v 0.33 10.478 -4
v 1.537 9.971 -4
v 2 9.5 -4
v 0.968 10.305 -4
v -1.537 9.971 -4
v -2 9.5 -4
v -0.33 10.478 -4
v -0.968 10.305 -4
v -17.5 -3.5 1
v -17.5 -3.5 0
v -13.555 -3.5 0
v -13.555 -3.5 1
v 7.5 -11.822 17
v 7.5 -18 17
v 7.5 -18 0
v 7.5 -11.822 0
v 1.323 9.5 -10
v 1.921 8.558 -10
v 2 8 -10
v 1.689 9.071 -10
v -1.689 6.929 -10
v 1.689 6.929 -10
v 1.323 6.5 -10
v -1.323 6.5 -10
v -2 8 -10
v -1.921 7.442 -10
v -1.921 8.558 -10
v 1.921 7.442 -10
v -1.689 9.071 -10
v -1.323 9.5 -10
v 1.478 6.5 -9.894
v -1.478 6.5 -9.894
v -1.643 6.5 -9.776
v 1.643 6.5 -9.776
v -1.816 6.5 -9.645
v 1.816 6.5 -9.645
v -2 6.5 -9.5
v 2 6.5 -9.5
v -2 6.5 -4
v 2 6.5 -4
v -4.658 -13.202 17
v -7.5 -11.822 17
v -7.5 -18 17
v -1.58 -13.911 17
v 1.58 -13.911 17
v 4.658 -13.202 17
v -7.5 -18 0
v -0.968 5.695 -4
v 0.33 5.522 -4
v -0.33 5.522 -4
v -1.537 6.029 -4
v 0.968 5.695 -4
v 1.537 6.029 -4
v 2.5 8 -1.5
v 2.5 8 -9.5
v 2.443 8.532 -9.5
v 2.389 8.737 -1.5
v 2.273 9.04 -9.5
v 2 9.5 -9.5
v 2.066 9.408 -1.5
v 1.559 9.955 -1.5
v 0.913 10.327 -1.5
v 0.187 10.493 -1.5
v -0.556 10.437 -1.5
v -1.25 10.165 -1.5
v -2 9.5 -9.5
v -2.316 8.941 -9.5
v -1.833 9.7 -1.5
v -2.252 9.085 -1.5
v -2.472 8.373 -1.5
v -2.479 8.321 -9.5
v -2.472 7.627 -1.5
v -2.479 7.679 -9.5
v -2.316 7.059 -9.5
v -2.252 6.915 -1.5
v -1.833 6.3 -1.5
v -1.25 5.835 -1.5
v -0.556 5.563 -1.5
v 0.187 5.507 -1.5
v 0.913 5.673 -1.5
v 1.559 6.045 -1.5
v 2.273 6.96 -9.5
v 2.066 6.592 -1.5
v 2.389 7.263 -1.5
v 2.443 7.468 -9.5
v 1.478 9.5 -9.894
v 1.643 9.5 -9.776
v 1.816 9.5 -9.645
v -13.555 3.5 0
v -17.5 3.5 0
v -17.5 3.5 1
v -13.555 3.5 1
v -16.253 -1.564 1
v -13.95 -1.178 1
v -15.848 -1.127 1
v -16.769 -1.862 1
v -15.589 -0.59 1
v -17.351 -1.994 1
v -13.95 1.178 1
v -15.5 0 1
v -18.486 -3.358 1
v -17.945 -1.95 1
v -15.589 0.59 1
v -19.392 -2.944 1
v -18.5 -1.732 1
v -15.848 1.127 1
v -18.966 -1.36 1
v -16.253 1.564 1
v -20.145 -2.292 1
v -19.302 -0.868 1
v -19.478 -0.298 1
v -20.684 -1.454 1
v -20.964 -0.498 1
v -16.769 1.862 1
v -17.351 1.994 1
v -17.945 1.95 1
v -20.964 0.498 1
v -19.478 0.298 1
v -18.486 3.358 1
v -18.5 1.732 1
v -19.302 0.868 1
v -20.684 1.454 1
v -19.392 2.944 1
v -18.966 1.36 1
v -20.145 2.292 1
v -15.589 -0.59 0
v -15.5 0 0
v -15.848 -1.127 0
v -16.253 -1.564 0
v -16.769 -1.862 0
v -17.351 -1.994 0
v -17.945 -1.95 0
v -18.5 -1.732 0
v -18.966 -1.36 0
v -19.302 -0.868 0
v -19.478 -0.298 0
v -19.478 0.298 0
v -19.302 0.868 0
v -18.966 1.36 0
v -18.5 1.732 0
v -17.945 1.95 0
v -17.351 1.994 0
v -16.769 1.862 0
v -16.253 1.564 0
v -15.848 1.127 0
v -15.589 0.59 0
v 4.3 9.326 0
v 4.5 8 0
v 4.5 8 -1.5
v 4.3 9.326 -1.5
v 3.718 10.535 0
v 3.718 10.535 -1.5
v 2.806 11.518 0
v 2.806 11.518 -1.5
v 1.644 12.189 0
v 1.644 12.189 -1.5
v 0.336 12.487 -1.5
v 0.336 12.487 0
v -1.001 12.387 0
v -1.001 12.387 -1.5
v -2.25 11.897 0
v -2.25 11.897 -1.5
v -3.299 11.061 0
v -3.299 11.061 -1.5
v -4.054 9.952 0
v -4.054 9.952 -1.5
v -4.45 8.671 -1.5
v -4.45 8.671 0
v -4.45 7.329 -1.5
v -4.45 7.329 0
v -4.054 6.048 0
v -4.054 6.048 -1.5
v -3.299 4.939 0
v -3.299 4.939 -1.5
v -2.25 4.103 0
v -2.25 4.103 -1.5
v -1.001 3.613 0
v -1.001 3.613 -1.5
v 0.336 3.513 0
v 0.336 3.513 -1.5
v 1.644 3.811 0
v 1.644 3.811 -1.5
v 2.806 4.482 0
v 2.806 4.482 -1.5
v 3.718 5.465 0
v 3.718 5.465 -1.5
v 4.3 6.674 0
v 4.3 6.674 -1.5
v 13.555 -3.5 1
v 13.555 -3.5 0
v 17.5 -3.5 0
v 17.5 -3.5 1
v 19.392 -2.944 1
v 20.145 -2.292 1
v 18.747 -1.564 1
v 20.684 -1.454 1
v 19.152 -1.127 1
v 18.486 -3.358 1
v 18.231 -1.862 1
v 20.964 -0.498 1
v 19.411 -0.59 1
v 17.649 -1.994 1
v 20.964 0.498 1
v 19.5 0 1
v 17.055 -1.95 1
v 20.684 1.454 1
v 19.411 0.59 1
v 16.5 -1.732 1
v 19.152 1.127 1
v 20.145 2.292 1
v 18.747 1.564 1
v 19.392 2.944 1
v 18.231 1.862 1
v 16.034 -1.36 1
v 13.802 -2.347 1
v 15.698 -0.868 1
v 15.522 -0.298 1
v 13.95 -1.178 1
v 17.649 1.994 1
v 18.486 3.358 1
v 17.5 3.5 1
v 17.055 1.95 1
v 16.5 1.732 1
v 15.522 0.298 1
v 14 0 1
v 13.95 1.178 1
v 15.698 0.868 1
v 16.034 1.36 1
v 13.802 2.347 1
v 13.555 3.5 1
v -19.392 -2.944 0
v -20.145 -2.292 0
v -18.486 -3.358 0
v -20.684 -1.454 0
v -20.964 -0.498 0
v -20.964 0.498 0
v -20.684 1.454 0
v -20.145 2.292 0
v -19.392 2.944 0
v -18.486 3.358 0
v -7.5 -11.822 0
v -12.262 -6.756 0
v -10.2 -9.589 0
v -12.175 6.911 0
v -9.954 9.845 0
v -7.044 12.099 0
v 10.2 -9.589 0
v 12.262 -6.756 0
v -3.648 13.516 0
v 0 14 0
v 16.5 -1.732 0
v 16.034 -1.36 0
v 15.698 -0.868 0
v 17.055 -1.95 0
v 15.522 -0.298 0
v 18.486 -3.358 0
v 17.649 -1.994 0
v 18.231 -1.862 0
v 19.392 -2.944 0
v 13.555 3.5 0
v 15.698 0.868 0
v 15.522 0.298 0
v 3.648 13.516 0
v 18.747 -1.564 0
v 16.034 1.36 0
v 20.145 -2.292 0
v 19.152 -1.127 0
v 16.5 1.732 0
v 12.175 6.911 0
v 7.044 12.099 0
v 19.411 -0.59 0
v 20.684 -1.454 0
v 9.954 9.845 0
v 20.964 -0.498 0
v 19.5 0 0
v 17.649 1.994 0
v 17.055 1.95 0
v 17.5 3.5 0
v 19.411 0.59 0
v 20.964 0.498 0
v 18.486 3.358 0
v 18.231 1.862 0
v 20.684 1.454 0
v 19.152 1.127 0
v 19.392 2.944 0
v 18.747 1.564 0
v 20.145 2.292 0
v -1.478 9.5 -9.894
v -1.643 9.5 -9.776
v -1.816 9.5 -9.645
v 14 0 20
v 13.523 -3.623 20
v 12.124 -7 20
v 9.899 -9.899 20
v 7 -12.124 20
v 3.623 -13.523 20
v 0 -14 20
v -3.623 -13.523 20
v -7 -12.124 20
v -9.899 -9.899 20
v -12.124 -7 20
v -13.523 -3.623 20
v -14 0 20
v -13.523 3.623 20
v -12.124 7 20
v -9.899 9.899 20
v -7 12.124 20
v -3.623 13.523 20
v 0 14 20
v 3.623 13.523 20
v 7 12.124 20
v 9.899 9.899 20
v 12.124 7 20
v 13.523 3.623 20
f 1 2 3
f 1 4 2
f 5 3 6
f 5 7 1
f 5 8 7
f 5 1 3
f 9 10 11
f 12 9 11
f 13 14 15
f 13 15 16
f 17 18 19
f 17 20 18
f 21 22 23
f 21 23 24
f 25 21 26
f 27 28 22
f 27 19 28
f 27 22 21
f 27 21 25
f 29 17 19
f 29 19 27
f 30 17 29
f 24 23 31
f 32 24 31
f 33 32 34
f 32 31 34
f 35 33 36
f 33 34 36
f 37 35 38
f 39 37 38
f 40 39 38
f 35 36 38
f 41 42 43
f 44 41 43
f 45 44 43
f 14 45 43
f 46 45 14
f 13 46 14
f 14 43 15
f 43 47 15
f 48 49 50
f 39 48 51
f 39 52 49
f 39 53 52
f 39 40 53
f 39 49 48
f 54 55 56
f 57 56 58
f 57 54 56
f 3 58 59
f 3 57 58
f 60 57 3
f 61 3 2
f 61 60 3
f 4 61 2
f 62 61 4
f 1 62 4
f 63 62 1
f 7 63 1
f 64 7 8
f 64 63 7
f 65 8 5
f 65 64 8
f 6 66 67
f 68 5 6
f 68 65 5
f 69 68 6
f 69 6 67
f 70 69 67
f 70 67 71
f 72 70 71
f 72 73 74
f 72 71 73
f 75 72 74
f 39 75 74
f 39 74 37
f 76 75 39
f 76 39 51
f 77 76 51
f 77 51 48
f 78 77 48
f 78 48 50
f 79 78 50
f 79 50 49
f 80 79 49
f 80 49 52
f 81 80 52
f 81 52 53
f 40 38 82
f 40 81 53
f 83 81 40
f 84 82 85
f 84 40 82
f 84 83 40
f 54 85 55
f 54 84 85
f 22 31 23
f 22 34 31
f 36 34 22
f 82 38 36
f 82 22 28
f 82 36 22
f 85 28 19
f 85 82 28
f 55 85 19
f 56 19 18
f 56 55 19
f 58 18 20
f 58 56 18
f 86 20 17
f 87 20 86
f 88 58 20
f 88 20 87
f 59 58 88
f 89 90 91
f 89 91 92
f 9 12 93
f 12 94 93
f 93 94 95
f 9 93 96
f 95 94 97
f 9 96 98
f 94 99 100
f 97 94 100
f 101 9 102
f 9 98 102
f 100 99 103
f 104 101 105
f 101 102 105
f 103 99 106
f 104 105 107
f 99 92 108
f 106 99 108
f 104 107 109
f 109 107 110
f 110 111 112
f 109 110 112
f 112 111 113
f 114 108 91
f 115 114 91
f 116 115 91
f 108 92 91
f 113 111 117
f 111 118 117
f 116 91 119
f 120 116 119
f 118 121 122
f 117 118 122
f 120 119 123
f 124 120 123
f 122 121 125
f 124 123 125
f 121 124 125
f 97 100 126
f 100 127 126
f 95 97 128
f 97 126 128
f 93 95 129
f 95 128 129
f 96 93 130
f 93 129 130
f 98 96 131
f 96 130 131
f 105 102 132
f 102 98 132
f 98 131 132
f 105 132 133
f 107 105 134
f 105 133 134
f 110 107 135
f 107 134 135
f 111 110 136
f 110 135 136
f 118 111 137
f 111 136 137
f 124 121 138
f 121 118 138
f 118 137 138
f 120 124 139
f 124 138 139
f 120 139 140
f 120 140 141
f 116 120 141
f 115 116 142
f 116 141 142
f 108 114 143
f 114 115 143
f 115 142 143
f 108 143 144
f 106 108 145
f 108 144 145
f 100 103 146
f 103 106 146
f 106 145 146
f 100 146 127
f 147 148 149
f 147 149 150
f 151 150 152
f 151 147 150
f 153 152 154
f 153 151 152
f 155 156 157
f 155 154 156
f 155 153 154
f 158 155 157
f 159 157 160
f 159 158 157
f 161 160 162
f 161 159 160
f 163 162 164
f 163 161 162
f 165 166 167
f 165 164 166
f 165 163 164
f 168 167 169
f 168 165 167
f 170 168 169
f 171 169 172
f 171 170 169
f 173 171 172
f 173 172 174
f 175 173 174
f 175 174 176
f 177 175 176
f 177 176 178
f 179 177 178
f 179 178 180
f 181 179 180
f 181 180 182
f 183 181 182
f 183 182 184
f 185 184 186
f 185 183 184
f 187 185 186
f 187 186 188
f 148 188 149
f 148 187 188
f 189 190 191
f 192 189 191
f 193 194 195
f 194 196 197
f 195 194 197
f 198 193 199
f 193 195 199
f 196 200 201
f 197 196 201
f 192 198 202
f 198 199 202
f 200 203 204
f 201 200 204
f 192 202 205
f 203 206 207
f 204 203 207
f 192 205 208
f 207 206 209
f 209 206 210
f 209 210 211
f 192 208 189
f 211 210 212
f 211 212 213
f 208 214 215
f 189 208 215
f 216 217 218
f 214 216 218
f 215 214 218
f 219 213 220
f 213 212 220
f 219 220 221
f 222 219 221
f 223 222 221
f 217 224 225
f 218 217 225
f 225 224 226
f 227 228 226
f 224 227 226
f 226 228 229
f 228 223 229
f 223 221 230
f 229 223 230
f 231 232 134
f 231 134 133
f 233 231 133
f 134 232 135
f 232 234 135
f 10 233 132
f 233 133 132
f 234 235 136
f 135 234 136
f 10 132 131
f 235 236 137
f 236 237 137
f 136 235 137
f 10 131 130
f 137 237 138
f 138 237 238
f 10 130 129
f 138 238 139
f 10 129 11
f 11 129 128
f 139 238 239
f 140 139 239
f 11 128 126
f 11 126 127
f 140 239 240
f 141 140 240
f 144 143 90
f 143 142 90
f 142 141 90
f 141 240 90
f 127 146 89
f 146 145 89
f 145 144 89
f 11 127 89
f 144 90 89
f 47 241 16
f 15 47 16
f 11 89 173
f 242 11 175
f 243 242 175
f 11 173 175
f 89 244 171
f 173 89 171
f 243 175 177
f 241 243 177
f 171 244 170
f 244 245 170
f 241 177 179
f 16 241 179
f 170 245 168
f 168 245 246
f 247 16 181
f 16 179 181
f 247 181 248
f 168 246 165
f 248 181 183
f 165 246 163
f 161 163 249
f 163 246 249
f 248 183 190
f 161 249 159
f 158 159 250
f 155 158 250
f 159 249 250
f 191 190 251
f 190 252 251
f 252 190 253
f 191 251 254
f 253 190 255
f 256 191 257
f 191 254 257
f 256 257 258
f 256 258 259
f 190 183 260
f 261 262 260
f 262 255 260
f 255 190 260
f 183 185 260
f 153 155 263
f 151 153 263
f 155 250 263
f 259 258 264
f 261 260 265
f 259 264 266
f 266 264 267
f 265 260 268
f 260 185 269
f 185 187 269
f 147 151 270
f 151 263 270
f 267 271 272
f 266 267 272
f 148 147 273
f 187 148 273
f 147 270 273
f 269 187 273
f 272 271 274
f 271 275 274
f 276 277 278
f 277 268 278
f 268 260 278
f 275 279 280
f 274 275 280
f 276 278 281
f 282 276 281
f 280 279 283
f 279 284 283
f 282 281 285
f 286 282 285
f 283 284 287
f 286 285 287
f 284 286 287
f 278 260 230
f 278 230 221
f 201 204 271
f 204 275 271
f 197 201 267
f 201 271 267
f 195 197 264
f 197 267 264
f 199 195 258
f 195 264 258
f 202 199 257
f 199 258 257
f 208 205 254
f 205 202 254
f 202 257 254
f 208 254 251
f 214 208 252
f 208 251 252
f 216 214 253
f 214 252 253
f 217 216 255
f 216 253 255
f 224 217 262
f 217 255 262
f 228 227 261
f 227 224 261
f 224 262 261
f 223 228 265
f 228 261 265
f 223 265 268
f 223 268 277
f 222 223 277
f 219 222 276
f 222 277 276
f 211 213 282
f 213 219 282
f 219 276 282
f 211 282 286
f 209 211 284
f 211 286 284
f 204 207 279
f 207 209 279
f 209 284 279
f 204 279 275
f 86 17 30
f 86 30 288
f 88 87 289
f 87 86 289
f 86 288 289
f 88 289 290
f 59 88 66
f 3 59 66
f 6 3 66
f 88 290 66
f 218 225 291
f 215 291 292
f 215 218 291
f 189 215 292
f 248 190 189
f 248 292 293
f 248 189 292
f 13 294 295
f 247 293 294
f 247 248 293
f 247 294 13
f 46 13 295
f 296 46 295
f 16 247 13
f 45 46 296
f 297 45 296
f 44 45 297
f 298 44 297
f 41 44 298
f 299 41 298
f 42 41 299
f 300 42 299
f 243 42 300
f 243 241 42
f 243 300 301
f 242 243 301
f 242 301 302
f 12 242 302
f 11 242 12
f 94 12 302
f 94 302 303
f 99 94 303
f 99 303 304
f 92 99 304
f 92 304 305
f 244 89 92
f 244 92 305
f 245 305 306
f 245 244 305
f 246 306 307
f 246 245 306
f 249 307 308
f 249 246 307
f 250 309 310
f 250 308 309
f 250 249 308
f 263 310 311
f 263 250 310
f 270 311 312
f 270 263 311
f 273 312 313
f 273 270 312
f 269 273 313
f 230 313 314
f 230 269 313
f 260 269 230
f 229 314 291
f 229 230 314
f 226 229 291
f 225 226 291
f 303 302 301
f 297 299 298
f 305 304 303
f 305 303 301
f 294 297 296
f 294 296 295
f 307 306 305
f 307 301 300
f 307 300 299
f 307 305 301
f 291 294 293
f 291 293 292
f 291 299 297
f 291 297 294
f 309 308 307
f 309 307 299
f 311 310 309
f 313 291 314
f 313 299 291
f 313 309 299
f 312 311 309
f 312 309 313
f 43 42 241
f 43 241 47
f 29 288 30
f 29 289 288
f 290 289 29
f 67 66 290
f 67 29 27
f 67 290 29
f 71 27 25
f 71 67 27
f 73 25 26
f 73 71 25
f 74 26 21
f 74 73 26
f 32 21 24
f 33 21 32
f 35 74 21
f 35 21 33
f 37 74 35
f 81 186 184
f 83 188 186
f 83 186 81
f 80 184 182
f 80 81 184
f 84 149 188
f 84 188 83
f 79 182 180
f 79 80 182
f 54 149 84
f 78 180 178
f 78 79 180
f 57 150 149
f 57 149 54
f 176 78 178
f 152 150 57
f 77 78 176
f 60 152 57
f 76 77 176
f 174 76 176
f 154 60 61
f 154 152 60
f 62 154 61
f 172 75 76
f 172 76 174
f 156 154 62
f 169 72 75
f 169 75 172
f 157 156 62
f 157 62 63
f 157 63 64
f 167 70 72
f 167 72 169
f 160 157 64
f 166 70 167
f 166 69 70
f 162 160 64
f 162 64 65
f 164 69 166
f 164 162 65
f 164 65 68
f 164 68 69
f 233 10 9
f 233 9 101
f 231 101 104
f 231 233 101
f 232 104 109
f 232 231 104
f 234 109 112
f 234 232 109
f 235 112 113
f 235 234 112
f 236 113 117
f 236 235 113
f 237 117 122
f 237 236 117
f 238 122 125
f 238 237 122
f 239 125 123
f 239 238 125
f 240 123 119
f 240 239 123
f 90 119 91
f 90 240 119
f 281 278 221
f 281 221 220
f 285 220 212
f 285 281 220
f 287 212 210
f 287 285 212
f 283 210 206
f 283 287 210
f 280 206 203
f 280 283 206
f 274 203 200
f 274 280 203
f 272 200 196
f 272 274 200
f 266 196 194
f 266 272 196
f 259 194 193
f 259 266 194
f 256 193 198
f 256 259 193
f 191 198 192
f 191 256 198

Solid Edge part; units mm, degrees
sketch "Sketch1" plane through (0, 0, 0) normal (0, 0, 1) x (1, 0, 0)
  circle A0 centre (0, 0) radius 14
  dimension "D1" = 28
extrude "Protrusion1" add sketch "Sketch1" along normal blind 20
sketch "Sketch2" plane through (0, 0, 0) normal (0, 0, 1) x (1, 0, 0)
  line L0 (-7.5, -18) -> (7.5, -18)
  line L1 (7.5, -18) -> (7.5, -8.1391)
  line L2 (7.5, -8.1391) -> (-7.5, -8.1391)
  line L3 (-7.5, -8.1391) -> (-7.5, -18)
  dimension "D1" = 32
  dimension "D2" = 15
extrude "ExtrudedProtrusion_2" add sketch "Sketch2" along normal blind 17
sketch "Sketch3" plane through (0, 0, 0) normal (0, 0, 1) x (1, 0, 0)
  circle A0 centre (-17.5, 0) radius 2
  circle A1 centre (17.5, 0) radius 2
  line L0 (-17.5, 3.5) -> (17.5, 3.5)
  line L1 (-17.5, -3.5) -> (17.5, -3.5)
  arc A2 (-17.5, -3.5) -> (-17.5, 3.5) centre (-17.5, 0) cw
  arc A3 (17.5, 3.5) -> (17.5, -3.5) centre (17.5, 0) cw
extrude "ExtrudedProtrusion_3" add sketch "Sketch3" along normal blind 1
sketch "Sketch4" plane through (0, -2, 0) normal (0, 0, -1) x (1, 0, 0)
  circle A0 centre (0, -10) radius 4.5
  dimension "D1" = 8
extrude "ExtrudedProtrusion_4" add sketch "Sketch4" along normal blind 1.5
sketch "Sketch5" plane through (0, -2, 0) normal (0, 0, -1) x (1, 0, 0)
  circle A0 centre (0, -10) radius 2.5
  dimension "D1" = 5
extrude "ExtrudedProtrusion_5" add sketch "Sketch5" along normal blind 10
chamfer "Letörés_1" distance 0.5 angle 45 1 edges at (-2.5, 8, -10)
sketch "Sketch6" plane through (0, 8, -10) normal (0, 0, -1) x (1, 0, 0)
  line L0 (-7.2706, -6.0348) -> (6.189, -6.0348)
  line L1 (6.189, -6.0348) -> (6.189, -1.5)
  line L2 (6.189, -1.5) -> (-7.2706, -1.5)
  line L3 (-7.2706, -1.5) -> (-7.2706, -6.0348)
  line L4 (-5.1689, 1.5) -> (6.5499, 1.5)
  line L5 (6.5499, 1.5) -> (6.5499, 5.1107)
  line L6 (6.5499, 5.1107) -> (-5.1689, 5.1107)
  line L7 (-5.1689, 5.1107) -> (-5.1689, 1.5)
  dimension "D1" = 3
  dimension "D2" = 1.5
  dimension "D3" = 1.5
extrude "ExtrudedCutout_1" cut sketch "Sketch6" against normal blind 6
